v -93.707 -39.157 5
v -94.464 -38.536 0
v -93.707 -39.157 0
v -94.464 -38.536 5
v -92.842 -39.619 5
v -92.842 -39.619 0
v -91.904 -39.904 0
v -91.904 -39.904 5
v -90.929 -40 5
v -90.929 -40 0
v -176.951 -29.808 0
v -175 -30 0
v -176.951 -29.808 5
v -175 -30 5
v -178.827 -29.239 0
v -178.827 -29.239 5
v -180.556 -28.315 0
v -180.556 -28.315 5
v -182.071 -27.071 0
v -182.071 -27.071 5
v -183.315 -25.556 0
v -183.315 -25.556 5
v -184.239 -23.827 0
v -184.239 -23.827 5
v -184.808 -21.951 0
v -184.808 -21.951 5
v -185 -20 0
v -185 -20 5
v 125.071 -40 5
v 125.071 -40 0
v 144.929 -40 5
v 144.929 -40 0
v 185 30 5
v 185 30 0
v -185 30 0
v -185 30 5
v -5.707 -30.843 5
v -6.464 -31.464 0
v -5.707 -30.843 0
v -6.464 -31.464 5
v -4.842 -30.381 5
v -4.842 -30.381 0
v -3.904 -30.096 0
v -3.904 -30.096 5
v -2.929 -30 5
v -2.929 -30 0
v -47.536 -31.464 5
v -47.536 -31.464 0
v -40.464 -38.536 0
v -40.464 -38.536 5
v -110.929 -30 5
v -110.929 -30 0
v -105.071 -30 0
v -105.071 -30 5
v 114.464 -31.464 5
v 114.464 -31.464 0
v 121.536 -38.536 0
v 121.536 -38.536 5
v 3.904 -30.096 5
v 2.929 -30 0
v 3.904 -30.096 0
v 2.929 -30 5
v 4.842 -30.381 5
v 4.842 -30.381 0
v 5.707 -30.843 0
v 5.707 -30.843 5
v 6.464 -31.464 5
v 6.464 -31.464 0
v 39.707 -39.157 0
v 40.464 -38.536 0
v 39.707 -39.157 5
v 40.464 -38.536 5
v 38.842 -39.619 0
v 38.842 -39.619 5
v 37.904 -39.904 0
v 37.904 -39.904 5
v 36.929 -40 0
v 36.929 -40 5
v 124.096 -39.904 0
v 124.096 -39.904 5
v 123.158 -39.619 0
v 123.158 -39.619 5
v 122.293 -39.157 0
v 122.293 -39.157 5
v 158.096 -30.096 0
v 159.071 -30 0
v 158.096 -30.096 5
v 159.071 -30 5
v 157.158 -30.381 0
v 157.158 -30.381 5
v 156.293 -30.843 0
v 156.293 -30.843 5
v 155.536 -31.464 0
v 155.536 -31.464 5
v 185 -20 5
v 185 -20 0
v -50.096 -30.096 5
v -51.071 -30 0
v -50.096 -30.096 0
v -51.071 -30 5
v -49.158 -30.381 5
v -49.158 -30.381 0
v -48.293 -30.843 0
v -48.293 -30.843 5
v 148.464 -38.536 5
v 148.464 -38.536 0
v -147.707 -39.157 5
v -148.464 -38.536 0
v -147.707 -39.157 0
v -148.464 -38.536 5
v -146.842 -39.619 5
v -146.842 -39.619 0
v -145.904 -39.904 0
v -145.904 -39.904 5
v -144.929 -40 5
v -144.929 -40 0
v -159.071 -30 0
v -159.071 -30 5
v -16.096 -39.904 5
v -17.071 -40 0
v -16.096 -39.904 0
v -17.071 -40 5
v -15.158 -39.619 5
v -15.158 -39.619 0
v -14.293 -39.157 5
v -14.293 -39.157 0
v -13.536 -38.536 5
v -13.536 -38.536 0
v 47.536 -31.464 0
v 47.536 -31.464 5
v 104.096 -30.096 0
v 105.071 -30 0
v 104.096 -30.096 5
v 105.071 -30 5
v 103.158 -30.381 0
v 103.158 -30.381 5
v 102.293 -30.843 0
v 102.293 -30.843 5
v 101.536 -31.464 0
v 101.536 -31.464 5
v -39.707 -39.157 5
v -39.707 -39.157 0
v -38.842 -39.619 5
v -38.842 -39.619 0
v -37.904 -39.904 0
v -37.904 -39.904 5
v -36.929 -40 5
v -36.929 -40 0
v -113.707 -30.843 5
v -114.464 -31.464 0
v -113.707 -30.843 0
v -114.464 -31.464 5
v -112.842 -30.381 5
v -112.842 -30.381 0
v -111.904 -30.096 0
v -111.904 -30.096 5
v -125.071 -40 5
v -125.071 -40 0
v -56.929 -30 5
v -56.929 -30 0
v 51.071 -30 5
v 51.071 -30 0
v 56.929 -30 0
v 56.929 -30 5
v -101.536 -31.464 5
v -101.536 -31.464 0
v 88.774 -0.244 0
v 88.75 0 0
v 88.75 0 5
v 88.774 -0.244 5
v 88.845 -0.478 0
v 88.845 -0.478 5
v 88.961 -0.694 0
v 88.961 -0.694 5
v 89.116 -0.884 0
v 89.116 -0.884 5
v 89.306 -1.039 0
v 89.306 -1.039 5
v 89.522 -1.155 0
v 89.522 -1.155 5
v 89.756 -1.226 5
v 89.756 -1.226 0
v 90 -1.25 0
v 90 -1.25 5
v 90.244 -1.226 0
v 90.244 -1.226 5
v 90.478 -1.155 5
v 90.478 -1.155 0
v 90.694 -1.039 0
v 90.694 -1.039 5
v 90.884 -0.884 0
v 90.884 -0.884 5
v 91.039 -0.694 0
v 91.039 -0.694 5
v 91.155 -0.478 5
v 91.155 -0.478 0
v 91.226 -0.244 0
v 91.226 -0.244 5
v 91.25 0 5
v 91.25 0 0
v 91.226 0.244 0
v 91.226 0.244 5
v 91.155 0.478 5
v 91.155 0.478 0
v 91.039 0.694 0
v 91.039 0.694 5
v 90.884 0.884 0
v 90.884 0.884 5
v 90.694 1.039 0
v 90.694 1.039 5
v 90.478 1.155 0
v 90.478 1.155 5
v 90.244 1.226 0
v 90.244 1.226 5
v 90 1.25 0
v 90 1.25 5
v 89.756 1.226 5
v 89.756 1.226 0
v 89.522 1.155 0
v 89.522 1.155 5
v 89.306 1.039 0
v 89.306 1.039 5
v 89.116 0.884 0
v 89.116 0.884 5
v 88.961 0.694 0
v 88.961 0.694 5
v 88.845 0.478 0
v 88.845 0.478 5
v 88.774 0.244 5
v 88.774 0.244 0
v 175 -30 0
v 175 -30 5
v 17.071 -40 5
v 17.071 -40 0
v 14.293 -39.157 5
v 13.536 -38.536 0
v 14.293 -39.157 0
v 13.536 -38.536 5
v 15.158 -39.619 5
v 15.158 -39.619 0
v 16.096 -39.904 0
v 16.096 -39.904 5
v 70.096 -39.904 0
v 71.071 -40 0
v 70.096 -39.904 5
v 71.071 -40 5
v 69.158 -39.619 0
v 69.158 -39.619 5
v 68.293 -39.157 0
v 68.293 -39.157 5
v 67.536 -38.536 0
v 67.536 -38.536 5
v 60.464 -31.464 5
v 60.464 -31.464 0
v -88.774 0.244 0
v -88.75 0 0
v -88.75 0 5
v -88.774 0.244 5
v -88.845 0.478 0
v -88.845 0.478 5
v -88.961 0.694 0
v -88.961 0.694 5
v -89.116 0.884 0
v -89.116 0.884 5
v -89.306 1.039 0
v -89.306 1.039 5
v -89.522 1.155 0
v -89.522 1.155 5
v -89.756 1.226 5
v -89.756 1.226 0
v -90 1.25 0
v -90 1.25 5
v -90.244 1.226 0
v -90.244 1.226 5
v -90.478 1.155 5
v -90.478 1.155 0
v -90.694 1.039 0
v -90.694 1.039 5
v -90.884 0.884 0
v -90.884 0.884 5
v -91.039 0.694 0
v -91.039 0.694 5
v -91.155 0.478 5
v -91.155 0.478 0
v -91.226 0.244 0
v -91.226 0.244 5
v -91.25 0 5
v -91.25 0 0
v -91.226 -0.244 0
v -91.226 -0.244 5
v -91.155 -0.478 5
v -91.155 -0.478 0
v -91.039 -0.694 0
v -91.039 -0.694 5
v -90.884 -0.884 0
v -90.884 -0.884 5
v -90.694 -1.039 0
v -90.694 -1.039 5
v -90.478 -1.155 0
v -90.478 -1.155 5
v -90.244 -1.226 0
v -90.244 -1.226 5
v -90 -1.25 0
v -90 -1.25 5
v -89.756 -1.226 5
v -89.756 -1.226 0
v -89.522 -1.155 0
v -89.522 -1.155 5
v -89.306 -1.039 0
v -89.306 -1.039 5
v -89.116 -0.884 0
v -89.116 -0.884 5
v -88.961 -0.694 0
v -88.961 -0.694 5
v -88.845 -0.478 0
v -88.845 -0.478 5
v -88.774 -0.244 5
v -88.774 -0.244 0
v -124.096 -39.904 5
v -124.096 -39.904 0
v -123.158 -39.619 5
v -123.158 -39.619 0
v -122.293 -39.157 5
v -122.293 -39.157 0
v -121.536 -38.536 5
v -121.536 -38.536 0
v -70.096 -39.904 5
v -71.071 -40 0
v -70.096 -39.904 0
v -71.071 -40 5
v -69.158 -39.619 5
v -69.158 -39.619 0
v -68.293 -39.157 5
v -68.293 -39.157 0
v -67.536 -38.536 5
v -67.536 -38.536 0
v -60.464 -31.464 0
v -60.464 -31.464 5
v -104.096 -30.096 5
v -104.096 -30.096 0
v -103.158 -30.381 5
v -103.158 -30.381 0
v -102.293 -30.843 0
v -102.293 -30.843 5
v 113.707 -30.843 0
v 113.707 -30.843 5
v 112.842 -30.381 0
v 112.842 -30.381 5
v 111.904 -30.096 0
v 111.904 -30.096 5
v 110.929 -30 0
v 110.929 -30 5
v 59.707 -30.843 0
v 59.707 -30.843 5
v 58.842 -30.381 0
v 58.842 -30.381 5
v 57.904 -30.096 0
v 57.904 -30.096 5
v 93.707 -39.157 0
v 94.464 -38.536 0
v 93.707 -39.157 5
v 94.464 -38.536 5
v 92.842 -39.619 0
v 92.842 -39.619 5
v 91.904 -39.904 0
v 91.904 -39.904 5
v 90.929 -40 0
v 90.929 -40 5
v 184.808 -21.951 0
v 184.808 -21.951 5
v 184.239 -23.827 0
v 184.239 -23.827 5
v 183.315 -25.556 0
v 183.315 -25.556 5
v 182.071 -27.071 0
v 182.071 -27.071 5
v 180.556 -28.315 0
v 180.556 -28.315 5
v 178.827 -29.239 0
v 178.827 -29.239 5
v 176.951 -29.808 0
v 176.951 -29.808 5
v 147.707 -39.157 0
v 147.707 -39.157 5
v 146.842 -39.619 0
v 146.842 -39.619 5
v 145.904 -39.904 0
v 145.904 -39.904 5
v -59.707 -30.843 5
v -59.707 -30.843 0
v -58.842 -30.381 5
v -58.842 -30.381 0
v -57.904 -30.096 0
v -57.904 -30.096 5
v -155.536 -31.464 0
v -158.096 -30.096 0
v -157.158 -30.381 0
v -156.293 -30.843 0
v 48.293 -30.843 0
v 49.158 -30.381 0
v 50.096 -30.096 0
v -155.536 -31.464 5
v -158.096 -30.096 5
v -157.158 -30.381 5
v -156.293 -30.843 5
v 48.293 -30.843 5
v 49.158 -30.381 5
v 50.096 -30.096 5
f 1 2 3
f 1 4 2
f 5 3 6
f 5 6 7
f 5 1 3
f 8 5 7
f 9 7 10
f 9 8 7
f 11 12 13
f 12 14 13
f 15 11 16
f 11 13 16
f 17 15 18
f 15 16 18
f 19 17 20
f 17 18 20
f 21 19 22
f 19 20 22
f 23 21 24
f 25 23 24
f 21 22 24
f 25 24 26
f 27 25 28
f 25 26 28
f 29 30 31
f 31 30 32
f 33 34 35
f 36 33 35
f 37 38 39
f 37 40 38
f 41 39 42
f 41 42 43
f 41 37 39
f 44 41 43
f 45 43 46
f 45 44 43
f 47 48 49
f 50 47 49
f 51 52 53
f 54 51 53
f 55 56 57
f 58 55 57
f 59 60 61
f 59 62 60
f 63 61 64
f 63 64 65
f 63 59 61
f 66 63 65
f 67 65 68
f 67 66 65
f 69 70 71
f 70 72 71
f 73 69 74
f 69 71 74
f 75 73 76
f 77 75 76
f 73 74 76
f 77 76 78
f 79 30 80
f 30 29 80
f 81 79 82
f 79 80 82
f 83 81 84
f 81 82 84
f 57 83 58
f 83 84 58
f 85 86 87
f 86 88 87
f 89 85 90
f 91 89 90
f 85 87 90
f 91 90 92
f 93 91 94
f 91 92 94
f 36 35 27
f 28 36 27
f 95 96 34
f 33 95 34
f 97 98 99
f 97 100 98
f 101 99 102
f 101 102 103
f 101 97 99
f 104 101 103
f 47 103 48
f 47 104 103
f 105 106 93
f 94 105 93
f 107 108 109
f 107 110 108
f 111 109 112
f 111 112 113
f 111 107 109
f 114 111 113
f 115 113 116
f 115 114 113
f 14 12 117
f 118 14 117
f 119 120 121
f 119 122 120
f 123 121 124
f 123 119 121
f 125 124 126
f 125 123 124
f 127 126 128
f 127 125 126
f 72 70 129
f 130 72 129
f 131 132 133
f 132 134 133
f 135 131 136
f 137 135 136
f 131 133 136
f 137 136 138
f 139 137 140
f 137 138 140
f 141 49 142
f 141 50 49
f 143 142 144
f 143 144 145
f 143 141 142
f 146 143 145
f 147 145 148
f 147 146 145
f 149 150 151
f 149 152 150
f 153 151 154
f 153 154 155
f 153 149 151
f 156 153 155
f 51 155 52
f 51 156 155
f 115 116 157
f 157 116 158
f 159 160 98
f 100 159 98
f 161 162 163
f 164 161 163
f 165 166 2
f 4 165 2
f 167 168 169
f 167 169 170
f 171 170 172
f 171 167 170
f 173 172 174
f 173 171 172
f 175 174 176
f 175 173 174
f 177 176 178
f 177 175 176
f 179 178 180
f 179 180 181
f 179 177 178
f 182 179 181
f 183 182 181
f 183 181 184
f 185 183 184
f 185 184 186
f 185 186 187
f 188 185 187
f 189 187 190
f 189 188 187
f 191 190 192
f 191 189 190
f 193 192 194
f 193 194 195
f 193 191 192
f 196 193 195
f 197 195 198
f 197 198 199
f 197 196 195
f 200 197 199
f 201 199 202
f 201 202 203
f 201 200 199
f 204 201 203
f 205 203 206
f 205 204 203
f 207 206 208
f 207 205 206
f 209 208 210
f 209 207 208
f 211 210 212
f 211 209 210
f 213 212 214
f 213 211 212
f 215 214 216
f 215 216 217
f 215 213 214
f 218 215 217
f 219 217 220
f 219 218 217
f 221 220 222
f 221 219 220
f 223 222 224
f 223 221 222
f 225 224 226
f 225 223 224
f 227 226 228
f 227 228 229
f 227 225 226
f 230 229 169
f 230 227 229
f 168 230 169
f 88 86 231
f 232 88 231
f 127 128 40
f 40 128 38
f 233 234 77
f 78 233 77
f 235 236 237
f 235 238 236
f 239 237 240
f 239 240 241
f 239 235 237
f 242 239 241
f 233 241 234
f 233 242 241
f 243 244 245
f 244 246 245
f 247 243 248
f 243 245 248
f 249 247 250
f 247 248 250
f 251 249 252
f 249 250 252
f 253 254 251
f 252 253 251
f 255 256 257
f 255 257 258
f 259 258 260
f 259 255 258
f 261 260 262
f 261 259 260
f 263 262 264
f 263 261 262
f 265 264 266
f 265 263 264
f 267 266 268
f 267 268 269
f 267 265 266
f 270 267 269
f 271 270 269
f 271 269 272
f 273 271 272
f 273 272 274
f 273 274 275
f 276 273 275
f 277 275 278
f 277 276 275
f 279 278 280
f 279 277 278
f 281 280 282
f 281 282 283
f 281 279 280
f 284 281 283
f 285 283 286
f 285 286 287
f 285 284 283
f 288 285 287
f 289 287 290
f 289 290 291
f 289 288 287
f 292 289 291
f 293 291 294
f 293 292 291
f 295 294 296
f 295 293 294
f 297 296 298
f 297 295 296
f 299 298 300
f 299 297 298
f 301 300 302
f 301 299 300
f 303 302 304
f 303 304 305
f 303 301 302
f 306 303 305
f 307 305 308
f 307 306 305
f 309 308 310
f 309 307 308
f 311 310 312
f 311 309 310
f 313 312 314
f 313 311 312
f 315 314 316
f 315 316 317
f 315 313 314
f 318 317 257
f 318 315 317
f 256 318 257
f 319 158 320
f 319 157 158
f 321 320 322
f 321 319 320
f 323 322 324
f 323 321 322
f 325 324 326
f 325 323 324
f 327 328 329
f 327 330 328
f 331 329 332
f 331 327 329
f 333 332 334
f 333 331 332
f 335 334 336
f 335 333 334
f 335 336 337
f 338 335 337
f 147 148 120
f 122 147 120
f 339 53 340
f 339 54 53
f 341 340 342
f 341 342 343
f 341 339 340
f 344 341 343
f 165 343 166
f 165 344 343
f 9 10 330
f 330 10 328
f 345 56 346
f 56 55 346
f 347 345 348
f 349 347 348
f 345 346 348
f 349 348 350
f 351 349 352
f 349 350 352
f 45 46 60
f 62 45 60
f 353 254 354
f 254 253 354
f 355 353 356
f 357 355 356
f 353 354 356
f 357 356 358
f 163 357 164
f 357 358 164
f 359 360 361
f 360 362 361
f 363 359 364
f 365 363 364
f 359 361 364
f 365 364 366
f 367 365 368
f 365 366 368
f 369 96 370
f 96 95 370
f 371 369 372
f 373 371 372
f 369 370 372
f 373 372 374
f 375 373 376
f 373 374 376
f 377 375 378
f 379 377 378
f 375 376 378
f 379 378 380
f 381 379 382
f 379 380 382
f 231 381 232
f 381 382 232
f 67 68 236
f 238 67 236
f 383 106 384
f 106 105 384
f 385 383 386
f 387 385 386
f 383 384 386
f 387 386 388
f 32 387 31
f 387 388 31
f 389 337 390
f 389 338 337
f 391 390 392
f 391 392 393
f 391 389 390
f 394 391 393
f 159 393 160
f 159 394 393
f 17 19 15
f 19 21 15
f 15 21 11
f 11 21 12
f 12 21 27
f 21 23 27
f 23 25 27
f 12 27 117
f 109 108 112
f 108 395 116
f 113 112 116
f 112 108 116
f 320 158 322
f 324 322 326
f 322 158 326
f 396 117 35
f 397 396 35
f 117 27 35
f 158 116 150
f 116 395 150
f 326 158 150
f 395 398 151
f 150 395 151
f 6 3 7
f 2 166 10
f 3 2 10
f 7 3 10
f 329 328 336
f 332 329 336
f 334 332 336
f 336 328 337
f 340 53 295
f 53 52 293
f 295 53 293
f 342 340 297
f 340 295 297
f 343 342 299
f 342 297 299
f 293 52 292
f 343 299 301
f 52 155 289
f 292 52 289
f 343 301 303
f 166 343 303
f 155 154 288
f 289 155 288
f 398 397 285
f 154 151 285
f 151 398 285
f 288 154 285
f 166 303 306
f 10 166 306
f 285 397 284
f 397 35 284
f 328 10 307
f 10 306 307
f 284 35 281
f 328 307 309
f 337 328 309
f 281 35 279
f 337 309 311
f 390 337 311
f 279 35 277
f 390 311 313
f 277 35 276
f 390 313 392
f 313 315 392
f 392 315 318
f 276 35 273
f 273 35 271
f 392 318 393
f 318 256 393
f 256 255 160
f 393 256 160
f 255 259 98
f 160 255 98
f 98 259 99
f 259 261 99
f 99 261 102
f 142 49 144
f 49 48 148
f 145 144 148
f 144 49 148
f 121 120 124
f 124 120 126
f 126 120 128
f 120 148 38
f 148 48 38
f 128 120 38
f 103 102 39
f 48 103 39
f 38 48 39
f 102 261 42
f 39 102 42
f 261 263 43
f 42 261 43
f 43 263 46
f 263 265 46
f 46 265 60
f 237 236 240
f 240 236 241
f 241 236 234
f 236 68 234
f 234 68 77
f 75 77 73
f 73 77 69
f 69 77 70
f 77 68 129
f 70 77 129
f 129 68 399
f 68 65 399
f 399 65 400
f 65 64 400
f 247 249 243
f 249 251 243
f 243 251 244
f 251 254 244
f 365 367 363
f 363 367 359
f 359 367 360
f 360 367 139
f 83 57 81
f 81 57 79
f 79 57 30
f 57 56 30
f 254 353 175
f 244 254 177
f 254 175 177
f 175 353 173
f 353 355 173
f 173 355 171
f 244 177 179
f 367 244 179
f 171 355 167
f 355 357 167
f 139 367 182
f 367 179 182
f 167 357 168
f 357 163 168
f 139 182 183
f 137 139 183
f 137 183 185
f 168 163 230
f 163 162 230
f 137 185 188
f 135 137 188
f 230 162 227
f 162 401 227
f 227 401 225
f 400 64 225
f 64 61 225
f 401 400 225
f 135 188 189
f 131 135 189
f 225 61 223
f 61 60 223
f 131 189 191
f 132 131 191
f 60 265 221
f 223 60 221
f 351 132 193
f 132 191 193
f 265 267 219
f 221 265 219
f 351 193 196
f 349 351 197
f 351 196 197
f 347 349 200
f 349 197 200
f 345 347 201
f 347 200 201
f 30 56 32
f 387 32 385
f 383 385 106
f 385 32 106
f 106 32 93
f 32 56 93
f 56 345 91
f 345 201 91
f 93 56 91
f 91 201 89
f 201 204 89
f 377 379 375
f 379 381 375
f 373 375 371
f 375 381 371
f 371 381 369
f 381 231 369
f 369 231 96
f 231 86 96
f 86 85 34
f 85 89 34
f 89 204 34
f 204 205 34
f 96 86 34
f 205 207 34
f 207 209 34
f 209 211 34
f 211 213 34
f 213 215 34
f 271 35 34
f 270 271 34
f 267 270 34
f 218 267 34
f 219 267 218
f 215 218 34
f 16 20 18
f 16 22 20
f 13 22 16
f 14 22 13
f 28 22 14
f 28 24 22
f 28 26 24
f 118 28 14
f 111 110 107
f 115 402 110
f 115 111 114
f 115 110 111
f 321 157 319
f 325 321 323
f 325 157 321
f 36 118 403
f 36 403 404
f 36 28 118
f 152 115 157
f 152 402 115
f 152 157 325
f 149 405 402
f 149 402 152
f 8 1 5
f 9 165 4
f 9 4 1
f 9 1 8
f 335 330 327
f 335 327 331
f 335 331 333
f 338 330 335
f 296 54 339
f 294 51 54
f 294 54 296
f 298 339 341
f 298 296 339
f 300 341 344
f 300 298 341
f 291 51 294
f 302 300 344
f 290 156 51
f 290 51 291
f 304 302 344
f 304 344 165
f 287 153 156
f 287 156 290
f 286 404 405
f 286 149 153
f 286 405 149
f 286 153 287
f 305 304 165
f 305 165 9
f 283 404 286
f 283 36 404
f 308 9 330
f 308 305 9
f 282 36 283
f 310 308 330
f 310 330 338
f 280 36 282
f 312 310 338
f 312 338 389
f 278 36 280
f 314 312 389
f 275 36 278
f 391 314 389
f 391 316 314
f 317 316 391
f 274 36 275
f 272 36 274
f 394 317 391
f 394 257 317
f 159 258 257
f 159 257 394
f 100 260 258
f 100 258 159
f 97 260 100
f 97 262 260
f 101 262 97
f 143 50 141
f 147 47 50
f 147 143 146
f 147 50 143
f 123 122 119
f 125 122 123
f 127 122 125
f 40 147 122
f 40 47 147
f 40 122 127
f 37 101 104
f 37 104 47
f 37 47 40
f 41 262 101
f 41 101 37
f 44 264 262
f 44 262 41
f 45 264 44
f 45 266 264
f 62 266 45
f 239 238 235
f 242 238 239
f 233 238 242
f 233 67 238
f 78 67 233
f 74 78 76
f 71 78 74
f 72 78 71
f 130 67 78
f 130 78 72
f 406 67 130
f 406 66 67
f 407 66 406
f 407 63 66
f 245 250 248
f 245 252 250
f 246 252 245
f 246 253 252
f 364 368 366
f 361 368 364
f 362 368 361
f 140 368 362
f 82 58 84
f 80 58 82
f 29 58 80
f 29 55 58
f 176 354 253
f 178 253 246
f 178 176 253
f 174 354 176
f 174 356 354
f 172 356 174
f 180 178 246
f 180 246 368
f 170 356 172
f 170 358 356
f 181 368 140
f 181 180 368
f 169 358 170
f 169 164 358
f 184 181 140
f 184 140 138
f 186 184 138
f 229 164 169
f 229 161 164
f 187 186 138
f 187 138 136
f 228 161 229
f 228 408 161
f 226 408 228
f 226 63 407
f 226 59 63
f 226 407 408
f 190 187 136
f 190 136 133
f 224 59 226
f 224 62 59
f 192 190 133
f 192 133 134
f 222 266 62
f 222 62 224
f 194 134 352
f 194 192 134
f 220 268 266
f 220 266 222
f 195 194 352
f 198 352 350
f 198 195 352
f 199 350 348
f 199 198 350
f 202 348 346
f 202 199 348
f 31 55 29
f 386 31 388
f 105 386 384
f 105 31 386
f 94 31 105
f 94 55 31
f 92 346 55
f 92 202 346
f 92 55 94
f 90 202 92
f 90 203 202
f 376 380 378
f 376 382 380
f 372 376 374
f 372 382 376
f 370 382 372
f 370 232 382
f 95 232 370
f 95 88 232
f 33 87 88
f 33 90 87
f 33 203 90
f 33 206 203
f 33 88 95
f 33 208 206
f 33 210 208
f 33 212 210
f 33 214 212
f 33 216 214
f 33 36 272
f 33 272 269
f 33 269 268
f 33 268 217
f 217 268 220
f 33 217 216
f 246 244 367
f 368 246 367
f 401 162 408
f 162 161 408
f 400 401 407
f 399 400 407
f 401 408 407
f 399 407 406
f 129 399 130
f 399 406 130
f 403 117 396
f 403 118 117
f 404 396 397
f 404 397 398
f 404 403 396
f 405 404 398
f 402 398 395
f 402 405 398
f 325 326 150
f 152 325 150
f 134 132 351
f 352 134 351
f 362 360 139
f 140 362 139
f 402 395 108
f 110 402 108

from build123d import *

# Parameters (mm, degrees)
SKETCH1_R           = 1.25
BOSS_EXTRUDE1_DEPTH = 5
FILLET1_R           = 5
FILLET2_R           = 10


with BuildPart() as part:
    # Sketch1 → Boss-Extrude1 (new body)
    with BuildSketch(Plane.XY):
        Polygon((-185, -30), (-157, -30), (-147, -40), (-123, -40), (-113, -30), (-103, -30), (-93, -40), (-69, -40), (-59, -30), (-49, -30), (-39, -40), (-15, -40), (-5, -30), (5, -30), (15, -40), (39, -40), (49, -30), (59, -30), (69, -40), (93, -40), (103, -30), (113, -30), (123, -40), (147, -40), (157, -30), (185, -30), (185, 30), (-185, 30), align=None)
        with Locations((-90, 0)):
            Circle(SKETCH1_R, mode=Mode.SUBTRACT)
        with Locations(Location((90, 0, 0), (0, 0, 180))):
            Circle(SKETCH1_R, mode=Mode.SUBTRACT)
    extrude(amount=BOSS_EXTRUDE1_DEPTH)

    # Fillet1
    fillet1_edges = [part.edges().sort_by_distance(p)[0] for p in [
        (157, -30, 2.5),
        (147, -40, 2.5),
        (123, -40, 2.5),
        (113, -30, 2.5),
        (103, -30, 2.5),
        (93, -40, 2.5),
        (69, -40, 2.5),
        (59, -30, 2.5),
        (49, -30, 2.5),
        (39, -40, 2.5),
        (15, -40, 2.5),
        (5, -30, 2.5),
        (-5, -30, 2.5),
        (-15, -40, 2.5),
        (-39, -40, 2.5),
        (-49, -30, 2.5),
        (-59, -30, 2.5),
        (-69, -40, 2.5),
        (-93, -40, 2.5),
        (-103, -30, 2.5),
        (-113, -30, 2.5),
        (-123, -40, 2.5),
        (-147, -40, 2.5),
        (-157, -30, 2.5),
    ]]
    fillet(fillet1_edges, radius=FILLET1_R)

    # Fillet2
    fillet2_edges = [part.edges().sort_by_distance(p)[0] for p in [
        (185, -30, 2.5),
        (-185, -30, 2.5),
    ]]
    fillet(fillet2_edges, radius=FILLET2_R)


solid = part.part
